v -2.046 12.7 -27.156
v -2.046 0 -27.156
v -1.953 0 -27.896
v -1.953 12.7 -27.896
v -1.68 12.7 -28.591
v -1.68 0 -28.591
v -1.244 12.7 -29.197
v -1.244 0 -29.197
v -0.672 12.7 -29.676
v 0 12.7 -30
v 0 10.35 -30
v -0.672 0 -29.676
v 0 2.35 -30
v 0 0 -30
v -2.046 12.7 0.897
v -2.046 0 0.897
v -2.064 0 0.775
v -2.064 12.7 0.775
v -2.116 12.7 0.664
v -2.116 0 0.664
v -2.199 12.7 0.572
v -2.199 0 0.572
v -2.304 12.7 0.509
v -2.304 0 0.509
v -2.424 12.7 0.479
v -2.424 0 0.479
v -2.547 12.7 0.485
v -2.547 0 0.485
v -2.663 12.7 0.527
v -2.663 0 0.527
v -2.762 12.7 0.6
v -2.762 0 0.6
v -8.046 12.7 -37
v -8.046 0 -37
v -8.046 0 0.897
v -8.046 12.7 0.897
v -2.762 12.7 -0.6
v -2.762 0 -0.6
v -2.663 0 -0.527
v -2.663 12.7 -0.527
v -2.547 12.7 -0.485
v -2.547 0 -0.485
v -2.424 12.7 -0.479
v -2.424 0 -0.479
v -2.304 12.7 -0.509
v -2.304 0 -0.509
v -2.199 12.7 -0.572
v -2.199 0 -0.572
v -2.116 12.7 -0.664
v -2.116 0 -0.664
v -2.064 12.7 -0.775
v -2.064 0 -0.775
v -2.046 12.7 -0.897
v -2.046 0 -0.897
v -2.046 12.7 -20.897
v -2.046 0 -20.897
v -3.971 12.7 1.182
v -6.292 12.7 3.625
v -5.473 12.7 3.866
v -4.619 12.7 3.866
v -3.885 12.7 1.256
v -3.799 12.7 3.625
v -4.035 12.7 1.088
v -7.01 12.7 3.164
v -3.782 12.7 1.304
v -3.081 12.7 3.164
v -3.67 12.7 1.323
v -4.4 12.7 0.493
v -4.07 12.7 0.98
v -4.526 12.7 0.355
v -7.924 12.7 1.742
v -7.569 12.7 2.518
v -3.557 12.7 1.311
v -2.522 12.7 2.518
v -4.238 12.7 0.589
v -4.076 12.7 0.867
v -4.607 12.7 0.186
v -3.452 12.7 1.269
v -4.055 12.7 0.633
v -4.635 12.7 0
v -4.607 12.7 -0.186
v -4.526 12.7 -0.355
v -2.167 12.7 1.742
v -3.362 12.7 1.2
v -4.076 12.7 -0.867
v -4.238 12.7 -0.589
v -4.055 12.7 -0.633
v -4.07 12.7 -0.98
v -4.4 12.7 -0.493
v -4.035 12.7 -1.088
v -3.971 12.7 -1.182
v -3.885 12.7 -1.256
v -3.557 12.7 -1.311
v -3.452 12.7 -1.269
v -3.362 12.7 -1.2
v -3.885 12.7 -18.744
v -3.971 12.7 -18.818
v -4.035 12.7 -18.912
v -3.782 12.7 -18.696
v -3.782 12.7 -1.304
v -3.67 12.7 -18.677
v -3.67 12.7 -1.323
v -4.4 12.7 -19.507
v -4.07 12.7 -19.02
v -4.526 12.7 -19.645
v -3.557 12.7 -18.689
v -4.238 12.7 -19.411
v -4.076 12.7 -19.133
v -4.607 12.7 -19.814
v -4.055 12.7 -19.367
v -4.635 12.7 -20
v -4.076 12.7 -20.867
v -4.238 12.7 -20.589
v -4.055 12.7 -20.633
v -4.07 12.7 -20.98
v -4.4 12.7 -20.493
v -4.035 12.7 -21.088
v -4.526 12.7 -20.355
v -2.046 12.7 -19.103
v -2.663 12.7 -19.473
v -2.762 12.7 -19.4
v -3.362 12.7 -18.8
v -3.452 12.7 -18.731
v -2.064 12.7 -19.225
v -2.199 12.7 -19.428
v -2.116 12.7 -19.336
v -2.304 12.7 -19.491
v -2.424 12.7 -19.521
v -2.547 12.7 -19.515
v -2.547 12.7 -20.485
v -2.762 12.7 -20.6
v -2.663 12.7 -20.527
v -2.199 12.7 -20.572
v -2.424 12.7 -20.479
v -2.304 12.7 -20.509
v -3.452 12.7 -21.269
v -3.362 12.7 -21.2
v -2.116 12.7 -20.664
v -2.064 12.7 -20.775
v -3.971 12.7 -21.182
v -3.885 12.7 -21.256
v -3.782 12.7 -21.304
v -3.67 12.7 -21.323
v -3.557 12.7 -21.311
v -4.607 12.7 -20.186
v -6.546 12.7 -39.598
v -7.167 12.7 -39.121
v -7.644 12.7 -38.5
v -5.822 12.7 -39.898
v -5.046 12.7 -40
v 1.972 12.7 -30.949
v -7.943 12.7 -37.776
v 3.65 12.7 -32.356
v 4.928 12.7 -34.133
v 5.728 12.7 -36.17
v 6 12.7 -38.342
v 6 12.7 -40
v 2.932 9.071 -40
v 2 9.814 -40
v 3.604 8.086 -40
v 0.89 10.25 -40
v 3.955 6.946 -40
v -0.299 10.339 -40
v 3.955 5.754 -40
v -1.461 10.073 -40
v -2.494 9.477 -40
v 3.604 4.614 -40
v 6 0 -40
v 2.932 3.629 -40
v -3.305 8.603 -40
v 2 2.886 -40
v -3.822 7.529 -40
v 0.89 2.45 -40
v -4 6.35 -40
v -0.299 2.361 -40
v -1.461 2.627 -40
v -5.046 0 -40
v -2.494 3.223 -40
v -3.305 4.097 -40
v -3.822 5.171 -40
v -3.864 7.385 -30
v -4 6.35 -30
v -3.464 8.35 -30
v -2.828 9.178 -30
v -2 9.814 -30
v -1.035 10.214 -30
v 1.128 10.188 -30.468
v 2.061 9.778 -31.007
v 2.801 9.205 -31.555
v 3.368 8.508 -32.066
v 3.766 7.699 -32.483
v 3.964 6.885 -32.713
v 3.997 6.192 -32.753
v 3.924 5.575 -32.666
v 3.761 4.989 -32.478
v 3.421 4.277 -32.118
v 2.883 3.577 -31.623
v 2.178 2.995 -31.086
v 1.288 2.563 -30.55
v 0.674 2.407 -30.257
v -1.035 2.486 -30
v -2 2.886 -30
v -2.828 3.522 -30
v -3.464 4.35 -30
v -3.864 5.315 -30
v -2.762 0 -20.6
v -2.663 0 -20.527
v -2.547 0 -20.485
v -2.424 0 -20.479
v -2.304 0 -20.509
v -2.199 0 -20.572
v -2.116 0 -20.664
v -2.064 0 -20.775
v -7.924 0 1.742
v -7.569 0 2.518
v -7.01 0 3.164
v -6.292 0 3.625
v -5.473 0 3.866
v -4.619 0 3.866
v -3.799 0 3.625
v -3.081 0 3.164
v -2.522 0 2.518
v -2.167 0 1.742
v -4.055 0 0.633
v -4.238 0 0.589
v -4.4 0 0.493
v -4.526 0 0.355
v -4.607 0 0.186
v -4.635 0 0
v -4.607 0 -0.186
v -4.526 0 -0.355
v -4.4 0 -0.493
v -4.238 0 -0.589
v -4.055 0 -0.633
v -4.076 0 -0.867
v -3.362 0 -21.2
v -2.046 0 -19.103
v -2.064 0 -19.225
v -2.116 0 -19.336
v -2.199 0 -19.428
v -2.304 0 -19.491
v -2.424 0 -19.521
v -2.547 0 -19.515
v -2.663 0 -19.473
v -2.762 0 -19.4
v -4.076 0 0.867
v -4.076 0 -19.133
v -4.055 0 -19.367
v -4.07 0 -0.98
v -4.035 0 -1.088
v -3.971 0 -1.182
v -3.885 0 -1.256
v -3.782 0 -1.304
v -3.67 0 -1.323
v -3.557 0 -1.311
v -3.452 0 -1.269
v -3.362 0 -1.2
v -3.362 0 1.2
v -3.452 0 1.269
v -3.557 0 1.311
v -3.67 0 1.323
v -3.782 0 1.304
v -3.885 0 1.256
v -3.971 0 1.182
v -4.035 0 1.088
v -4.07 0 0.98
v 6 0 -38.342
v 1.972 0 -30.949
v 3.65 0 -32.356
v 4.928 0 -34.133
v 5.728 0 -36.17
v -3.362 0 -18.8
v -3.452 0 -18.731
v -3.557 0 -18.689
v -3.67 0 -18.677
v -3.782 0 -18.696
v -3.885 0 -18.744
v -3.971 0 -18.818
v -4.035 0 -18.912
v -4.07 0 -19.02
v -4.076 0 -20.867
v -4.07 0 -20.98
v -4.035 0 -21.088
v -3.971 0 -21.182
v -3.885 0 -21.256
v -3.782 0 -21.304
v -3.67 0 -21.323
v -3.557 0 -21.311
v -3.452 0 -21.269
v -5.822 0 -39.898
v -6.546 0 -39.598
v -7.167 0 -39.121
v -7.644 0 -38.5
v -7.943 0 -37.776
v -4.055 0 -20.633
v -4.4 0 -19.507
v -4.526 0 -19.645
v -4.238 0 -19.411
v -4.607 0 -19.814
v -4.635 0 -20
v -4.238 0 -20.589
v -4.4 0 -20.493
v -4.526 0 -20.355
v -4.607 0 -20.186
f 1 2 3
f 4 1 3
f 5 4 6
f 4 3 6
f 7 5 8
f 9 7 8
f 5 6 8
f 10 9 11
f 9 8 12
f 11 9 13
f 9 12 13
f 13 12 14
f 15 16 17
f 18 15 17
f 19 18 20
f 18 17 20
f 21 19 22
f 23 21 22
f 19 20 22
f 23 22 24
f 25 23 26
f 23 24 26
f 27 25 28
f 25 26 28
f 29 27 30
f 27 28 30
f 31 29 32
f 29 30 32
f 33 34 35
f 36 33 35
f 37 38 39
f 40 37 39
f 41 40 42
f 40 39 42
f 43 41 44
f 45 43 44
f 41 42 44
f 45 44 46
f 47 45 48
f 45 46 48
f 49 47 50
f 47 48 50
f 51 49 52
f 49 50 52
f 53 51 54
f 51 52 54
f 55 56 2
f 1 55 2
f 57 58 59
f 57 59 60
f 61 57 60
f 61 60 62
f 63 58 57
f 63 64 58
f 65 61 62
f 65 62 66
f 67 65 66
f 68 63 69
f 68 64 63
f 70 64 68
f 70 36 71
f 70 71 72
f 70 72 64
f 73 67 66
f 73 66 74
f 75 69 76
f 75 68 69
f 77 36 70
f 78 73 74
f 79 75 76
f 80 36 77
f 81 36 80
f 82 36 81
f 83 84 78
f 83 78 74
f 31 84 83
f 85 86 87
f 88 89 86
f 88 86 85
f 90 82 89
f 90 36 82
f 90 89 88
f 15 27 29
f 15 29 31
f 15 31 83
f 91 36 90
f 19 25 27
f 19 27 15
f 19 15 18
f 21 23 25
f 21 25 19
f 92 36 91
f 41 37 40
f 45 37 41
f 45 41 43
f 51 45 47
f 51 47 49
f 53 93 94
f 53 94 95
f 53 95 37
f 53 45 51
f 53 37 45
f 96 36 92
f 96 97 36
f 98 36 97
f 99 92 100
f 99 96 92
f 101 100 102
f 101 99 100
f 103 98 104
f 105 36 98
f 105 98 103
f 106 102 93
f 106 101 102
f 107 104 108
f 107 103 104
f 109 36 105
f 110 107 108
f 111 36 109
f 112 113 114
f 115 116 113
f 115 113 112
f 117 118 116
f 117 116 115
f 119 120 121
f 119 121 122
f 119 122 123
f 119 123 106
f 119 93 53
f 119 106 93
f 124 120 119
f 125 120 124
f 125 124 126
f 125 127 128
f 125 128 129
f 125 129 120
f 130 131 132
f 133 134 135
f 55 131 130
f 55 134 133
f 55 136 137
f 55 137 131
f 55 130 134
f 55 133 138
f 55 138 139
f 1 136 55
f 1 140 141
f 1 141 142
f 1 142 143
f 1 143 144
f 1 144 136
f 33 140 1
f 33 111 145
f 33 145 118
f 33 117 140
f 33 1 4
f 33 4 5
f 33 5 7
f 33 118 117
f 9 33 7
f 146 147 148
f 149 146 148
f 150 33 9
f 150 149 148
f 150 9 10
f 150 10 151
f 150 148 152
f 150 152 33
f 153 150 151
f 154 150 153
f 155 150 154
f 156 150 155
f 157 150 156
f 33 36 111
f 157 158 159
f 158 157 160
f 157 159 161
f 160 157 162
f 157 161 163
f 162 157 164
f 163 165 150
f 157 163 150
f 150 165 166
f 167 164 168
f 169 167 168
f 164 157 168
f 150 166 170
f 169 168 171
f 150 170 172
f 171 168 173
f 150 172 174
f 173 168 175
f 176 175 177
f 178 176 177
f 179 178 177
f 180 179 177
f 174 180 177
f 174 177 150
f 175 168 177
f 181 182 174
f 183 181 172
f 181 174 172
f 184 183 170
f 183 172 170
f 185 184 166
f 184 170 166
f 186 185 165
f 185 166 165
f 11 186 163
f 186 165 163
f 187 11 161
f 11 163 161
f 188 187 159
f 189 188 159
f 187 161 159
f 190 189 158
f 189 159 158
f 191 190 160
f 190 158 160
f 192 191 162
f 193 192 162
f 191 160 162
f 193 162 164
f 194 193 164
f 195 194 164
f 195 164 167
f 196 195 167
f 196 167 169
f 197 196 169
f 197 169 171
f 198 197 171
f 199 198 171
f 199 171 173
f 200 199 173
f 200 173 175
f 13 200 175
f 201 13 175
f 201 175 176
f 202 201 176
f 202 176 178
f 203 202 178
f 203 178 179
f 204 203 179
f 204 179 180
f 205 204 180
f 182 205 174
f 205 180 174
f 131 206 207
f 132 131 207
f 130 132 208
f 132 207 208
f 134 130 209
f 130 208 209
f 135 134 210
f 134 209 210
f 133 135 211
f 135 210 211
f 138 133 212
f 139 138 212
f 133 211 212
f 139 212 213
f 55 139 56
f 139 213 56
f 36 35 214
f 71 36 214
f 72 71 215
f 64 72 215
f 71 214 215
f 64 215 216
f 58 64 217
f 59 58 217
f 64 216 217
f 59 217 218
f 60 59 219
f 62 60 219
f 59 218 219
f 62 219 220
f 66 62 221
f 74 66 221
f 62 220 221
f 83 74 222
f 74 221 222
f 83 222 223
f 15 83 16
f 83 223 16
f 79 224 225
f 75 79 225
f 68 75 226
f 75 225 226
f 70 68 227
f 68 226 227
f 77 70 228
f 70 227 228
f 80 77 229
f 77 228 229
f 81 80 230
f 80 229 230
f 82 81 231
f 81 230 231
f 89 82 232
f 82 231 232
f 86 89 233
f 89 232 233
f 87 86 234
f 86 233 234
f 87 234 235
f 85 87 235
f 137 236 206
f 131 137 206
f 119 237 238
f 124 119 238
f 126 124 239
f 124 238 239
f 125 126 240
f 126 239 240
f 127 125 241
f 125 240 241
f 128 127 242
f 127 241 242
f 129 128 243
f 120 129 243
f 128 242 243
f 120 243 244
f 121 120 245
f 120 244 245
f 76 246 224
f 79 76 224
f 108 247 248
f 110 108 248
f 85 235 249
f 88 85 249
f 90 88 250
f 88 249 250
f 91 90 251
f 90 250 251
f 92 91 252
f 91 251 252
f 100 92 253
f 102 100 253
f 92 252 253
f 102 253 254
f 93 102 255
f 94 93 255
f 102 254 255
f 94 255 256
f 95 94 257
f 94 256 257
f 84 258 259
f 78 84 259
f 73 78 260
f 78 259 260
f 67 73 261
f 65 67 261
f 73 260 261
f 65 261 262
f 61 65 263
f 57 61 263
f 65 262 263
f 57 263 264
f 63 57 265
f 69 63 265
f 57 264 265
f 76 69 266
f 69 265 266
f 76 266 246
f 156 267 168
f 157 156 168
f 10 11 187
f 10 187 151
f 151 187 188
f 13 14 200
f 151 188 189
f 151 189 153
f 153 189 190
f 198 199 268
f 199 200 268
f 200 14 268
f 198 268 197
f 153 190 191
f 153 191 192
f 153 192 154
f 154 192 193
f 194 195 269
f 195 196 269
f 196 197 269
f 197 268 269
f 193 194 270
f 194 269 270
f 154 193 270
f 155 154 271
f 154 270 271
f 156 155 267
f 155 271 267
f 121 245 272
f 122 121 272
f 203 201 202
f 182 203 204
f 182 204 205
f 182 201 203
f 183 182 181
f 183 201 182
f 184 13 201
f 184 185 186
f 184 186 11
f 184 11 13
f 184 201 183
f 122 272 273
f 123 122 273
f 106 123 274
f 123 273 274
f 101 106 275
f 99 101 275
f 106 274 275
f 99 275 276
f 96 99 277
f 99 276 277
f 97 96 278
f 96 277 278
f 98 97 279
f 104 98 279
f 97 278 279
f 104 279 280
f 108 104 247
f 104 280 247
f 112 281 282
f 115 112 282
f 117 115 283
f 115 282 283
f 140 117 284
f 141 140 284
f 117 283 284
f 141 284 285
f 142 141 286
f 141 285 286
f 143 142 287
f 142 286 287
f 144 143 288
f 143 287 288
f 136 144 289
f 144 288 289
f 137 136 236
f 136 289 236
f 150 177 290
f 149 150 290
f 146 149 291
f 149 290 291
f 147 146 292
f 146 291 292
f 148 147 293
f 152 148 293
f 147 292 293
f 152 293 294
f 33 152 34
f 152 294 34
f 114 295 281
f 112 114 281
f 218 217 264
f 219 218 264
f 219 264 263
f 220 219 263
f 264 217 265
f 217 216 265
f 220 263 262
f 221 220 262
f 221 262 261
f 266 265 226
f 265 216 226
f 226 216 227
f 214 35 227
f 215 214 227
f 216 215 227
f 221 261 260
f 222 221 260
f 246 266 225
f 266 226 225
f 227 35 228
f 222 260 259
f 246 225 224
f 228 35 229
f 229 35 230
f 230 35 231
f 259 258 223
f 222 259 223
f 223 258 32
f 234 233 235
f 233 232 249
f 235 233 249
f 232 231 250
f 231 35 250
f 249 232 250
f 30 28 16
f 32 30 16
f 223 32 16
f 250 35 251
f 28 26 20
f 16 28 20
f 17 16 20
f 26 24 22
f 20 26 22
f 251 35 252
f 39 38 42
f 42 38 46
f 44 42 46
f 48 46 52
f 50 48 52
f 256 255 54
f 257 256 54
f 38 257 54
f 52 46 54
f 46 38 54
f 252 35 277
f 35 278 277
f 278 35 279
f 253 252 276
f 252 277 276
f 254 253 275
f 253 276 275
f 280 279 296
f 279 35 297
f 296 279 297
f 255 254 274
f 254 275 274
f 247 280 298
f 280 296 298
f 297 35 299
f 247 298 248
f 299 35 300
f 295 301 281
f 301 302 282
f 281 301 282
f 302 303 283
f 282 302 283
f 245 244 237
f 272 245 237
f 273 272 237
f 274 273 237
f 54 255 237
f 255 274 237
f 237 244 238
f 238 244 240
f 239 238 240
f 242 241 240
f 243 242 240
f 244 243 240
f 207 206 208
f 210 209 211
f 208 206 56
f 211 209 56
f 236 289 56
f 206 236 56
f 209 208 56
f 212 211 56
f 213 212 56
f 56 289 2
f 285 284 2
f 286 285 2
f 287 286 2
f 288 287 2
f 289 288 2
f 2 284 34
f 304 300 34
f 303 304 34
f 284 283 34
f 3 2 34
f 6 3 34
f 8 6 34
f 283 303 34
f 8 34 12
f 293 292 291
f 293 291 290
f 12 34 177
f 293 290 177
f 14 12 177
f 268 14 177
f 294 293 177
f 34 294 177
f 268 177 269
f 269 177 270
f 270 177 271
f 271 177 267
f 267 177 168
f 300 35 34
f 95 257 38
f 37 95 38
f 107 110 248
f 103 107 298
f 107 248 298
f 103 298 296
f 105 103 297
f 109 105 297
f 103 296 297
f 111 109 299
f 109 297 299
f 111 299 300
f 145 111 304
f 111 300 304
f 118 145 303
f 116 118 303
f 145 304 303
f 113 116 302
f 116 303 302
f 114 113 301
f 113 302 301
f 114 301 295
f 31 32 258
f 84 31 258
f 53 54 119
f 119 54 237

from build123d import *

# Parameters (mm, degrees)
BOSS_EXTRUDE1_DEPTH = 12.7
SKETCH2_R           = 4
CUT_EXTRUDE1_DEPTH  = 10


with BuildPart() as part:
    # Sketch1 → Boss-Extrude1 (new body)
    with BuildSketch(Plane(origin=(0, 0, 0), x_dir=(1, 0, 0), z_dir=(0, 1, 0))):
        with BuildLine():
            Line((-4.055343897, 0.632583633), (-4.075844459, 0.866906139))
            ThreePointArc((-4.075844459, 0.866906139), (-3.83530083, 1.283539926), (-3.361522369, 1.2))
            Line((-3.361522369, 1.2), (-2.761522369, 0.6))
            ThreePointArc((-2.761522369, 0.6), (-2.304491577, 0.509090923), (-2.04560443, 0.89654292))
            Line((-2.04560443, 0.89654292), (-2.04560443, 19.10345708))
            ThreePointArc((-2.04560443, 19.10345708), (-2.304491577, 19.490909077), (-2.761522369, 19.4))
            Line((-2.761522369, 19.4), (-3.361522369, 18.8))
            ThreePointArc((-3.361522369, 18.8), (-3.83530083, 18.716460074), (-4.075844459, 19.133093861))
            Line((-4.075844459, 19.133093861), (-4.055343897, 19.367416367))
            ThreePointArc((-4.055343897, 19.367416367), (-4.635, 20), (-4.055343897, 20.632583633))
            Line((-4.055343897, 20.632583633), (-4.075844459, 20.866906139))
            ThreePointArc((-4.075844459, 20.866906139), (-3.83530083, 21.283539926), (-3.361522369, 21.2))
            Line((-3.361522369, 21.2), (-2.761522369, 20.6))
            ThreePointArc((-2.761522369, 20.6), (-2.304491577, 20.509090923), (-2.04560443, 20.89654292))
            Line((-2.04560443, 20.89654292), (-2.04560443, 27.15586057))
            ThreePointArc((-2.04560443, 27.15586057), (-1.481090696, 28.90754737), (0, 30))
            ThreePointArc((0, 30), (4.34421438, 33.204292914), (6, 38.342197704))
            Line((6, 38.342197704), (6, 40))
            Line((6, 40), (-5.04560443, 40))
            ThreePointArc((-5.04560443, 40), (-7.166924773, 39.121320344), (-8.04560443, 37))
            Line((-8.04560443, 37), (-8.04560443, -0.89654292))
            ThreePointArc((-8.04560443, -0.89654292), (-5.04560443, -3.89654292), (-2.04560443, -0.89654292))
            ThreePointArc((-2.04560443, -0.89654292), (-2.304491577, -0.509090923), (-2.761522369, -0.6))
            Line((-2.761522369, -0.6), (-3.361522369, -1.2))
            ThreePointArc((-3.361522369, -1.2), (-3.83530083, -1.283539926), (-4.075844459, -0.866906139))
            Line((-4.075844459, -0.866906139), (-4.055343897, -0.632583633))
            ThreePointArc((-4.055343897, -0.632583633), (-4.635, 0), (-4.055343897, 0.632583633))
        make_face()
    extrude(amount=BOSS_EXTRUDE1_DEPTH)

    # Sketch2 → Cut-Extrude1 (cut)
    with BuildSketch(Plane(origin=(0, 0, -40), x_dir=(-1, 0, 0), z_dir=(0, 0, -1))):
        with Locations((0, 6.35)):
            Circle(SKETCH2_R)
    extrude(amount=-CUT_EXTRUDE1_DEPTH, mode=Mode.SUBTRACT)


solid = part.part
